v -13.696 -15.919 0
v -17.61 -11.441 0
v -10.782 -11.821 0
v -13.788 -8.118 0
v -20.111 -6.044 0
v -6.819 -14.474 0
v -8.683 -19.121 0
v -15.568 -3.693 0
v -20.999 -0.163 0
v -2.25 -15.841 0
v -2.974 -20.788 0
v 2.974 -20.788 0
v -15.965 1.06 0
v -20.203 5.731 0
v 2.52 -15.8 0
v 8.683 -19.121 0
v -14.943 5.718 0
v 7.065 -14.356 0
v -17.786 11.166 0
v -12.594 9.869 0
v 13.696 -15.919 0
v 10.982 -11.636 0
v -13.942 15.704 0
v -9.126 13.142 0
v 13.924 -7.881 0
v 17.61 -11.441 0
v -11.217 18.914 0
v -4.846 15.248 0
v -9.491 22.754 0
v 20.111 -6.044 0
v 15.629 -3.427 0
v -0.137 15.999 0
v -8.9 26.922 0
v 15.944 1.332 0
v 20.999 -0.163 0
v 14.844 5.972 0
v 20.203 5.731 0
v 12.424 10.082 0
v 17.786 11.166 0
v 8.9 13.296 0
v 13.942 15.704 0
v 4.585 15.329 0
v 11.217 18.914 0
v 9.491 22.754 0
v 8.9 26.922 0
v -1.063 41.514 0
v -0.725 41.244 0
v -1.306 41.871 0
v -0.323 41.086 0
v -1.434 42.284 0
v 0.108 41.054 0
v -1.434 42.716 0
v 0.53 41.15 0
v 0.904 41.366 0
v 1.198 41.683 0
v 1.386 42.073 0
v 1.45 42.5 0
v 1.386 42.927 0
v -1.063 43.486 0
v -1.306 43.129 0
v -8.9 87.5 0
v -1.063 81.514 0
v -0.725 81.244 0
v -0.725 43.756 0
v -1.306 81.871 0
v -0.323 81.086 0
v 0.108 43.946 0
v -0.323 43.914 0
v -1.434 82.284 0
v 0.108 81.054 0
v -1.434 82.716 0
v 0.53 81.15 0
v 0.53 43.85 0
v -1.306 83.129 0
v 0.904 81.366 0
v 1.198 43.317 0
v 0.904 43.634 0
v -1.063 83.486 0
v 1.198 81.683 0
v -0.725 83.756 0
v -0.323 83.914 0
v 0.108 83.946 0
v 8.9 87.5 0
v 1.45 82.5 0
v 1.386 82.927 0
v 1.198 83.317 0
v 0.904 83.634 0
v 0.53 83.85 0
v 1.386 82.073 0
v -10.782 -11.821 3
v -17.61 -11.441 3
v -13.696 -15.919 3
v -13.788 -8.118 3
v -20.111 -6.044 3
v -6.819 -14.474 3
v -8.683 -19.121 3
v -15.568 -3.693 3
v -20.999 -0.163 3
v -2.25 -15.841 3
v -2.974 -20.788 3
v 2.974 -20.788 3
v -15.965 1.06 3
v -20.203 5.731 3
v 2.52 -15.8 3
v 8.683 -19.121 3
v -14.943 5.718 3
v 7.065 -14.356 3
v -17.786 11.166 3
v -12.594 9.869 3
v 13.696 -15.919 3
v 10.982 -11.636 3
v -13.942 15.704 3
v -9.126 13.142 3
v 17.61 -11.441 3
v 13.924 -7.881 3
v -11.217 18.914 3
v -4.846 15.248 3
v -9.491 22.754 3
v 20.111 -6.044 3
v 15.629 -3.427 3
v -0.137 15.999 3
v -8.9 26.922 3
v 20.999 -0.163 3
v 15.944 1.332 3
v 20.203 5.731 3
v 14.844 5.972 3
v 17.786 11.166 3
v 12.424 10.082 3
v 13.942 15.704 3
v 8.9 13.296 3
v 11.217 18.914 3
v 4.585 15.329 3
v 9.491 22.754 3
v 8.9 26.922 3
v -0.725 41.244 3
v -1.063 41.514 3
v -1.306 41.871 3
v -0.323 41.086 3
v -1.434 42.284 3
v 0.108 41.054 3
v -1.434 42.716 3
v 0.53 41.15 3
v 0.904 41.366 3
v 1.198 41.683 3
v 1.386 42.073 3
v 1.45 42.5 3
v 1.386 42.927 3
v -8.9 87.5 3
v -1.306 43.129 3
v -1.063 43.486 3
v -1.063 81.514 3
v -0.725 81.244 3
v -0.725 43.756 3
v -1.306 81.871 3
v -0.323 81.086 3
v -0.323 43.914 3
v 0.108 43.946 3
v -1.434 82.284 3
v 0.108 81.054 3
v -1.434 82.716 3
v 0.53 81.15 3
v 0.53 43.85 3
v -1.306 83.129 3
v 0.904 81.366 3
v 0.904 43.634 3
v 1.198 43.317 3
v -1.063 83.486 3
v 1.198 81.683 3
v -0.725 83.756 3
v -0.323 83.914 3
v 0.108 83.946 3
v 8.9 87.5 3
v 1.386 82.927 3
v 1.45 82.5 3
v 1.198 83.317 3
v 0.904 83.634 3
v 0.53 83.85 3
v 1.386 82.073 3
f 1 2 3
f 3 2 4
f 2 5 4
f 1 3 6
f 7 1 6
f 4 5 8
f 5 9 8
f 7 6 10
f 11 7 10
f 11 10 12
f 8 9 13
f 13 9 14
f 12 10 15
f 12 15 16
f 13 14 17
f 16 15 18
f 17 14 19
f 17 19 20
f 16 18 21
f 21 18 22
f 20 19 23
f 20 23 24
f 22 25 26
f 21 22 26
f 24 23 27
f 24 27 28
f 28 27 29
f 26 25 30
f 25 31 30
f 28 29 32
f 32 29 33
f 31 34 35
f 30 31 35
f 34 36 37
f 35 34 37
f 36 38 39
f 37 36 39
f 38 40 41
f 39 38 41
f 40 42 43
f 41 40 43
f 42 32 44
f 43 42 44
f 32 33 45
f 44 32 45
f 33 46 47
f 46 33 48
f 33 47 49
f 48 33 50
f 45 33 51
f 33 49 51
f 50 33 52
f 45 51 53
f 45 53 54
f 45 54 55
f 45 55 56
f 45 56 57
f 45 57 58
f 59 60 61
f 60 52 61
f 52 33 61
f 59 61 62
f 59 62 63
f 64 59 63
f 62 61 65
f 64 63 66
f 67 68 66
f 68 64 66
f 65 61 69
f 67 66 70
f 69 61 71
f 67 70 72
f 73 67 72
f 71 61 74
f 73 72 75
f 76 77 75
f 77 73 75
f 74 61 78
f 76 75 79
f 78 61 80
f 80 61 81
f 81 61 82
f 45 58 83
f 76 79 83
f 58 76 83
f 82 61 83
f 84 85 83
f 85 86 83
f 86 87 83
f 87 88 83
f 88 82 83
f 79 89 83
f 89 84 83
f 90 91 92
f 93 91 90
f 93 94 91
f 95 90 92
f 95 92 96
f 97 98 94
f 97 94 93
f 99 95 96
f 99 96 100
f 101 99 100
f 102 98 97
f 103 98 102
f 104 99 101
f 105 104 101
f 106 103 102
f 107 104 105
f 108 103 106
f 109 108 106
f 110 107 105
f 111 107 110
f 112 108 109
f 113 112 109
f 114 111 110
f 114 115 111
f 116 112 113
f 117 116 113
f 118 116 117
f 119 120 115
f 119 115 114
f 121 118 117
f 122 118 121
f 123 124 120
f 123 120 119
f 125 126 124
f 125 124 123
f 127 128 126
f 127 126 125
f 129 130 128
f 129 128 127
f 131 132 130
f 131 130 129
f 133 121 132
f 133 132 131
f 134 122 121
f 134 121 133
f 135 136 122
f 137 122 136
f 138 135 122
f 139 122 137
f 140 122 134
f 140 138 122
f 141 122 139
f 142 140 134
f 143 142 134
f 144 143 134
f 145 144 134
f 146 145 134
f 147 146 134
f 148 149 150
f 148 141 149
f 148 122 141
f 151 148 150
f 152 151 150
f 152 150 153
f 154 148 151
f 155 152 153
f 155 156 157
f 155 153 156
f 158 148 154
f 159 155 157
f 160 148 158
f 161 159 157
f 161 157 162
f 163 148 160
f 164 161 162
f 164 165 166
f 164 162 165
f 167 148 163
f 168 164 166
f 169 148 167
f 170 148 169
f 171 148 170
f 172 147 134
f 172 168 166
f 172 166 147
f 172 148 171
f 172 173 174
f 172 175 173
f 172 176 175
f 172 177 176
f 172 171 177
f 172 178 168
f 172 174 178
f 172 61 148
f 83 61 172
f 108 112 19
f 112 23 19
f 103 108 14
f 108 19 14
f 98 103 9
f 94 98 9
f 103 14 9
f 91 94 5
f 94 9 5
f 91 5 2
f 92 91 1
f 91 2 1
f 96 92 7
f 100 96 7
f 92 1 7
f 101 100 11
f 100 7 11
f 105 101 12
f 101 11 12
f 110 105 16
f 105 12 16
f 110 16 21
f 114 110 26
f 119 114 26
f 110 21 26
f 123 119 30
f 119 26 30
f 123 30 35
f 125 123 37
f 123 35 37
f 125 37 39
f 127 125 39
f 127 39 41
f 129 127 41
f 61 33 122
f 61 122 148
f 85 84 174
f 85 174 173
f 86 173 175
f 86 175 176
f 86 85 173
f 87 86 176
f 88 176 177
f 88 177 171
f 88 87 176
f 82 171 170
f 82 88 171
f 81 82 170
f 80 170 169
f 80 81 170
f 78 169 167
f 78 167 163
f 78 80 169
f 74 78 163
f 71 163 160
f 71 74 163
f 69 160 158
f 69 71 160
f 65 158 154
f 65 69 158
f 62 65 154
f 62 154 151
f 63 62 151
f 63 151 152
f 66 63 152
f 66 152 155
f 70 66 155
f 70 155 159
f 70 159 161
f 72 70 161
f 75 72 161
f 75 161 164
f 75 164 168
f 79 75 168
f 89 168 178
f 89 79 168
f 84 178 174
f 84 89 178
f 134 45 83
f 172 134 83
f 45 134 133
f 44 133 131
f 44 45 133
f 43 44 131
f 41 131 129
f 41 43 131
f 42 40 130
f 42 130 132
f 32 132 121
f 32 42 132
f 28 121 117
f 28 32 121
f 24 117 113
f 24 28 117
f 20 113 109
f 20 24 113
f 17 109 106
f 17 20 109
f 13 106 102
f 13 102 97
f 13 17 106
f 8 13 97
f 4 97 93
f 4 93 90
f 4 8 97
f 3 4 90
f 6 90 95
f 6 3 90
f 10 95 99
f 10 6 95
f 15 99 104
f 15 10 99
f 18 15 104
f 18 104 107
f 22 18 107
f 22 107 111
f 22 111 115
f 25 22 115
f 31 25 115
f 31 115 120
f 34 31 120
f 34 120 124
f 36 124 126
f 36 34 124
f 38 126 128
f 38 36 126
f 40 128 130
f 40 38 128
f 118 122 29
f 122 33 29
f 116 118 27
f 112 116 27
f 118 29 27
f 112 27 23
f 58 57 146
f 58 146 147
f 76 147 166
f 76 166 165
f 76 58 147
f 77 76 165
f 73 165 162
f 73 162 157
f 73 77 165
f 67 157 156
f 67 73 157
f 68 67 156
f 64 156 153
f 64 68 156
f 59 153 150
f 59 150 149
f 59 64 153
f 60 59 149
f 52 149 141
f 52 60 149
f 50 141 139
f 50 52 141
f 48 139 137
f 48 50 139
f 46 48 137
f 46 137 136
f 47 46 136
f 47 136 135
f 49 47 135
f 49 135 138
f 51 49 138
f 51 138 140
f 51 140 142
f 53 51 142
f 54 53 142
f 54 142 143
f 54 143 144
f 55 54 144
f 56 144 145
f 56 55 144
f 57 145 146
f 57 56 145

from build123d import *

# Parameters (mm, degrees)
SKETCH_1_R          = 21
SKETCH_1_R_2        = 16
EXTRUDE_1_DEPTH     = 3
SKETCH_2_W          = 17.8
SKETCH_2_H          = 75
SKETCH_2_R          = 1.45
EXTRUDE_2_DEPTH     = 3
SKETCH_3_R          = 16
CUT_EXTRUDE_1_DEPTH = 91.034715527
FILLET_1_R          = 15


with BuildPart() as part:
    # 草图1 → 凸台-拉伸1 (new body)
    with BuildSketch(Plane.XY):
        Circle(SKETCH_1_R)
        Circle(SKETCH_1_R_2, mode=Mode.SUBTRACT)
    extrude(amount=EXTRUDE_1_DEPTH)

    # 草图2 → 凸台-拉伸2 (add)
    with BuildSketch(Plane.XY):
        with Locations((0, 50)):
            Rectangle(SKETCH_2_W, SKETCH_2_H)
        with Locations((0, 42.5)):
            Circle(SKETCH_2_R, mode=Mode.SUBTRACT)
        with Locations((0, 82.5)):
            Circle(SKETCH_2_R, mode=Mode.SUBTRACT)
    extrude(amount=EXTRUDE_2_DEPTH)

    # 草图3 → 切除-拉伸1 (cut, through all)
    with BuildSketch(Plane.XY.offset(3)):
        Circle(SKETCH_3_R)
    extrude(amount=-CUT_EXTRUDE_1_DEPTH, mode=Mode.SUBTRACT)

    # 圆角1
    fillet_1_edges = [part.edges().sort_by_distance(p)[0] for p in [
        (8.9, 19.020778112, 1.5),
        (-8.9, 19.020778112, 1.5),
    ]]
    fillet(fillet_1_edges, radius=FILLET_1_R)


solid = part.part
